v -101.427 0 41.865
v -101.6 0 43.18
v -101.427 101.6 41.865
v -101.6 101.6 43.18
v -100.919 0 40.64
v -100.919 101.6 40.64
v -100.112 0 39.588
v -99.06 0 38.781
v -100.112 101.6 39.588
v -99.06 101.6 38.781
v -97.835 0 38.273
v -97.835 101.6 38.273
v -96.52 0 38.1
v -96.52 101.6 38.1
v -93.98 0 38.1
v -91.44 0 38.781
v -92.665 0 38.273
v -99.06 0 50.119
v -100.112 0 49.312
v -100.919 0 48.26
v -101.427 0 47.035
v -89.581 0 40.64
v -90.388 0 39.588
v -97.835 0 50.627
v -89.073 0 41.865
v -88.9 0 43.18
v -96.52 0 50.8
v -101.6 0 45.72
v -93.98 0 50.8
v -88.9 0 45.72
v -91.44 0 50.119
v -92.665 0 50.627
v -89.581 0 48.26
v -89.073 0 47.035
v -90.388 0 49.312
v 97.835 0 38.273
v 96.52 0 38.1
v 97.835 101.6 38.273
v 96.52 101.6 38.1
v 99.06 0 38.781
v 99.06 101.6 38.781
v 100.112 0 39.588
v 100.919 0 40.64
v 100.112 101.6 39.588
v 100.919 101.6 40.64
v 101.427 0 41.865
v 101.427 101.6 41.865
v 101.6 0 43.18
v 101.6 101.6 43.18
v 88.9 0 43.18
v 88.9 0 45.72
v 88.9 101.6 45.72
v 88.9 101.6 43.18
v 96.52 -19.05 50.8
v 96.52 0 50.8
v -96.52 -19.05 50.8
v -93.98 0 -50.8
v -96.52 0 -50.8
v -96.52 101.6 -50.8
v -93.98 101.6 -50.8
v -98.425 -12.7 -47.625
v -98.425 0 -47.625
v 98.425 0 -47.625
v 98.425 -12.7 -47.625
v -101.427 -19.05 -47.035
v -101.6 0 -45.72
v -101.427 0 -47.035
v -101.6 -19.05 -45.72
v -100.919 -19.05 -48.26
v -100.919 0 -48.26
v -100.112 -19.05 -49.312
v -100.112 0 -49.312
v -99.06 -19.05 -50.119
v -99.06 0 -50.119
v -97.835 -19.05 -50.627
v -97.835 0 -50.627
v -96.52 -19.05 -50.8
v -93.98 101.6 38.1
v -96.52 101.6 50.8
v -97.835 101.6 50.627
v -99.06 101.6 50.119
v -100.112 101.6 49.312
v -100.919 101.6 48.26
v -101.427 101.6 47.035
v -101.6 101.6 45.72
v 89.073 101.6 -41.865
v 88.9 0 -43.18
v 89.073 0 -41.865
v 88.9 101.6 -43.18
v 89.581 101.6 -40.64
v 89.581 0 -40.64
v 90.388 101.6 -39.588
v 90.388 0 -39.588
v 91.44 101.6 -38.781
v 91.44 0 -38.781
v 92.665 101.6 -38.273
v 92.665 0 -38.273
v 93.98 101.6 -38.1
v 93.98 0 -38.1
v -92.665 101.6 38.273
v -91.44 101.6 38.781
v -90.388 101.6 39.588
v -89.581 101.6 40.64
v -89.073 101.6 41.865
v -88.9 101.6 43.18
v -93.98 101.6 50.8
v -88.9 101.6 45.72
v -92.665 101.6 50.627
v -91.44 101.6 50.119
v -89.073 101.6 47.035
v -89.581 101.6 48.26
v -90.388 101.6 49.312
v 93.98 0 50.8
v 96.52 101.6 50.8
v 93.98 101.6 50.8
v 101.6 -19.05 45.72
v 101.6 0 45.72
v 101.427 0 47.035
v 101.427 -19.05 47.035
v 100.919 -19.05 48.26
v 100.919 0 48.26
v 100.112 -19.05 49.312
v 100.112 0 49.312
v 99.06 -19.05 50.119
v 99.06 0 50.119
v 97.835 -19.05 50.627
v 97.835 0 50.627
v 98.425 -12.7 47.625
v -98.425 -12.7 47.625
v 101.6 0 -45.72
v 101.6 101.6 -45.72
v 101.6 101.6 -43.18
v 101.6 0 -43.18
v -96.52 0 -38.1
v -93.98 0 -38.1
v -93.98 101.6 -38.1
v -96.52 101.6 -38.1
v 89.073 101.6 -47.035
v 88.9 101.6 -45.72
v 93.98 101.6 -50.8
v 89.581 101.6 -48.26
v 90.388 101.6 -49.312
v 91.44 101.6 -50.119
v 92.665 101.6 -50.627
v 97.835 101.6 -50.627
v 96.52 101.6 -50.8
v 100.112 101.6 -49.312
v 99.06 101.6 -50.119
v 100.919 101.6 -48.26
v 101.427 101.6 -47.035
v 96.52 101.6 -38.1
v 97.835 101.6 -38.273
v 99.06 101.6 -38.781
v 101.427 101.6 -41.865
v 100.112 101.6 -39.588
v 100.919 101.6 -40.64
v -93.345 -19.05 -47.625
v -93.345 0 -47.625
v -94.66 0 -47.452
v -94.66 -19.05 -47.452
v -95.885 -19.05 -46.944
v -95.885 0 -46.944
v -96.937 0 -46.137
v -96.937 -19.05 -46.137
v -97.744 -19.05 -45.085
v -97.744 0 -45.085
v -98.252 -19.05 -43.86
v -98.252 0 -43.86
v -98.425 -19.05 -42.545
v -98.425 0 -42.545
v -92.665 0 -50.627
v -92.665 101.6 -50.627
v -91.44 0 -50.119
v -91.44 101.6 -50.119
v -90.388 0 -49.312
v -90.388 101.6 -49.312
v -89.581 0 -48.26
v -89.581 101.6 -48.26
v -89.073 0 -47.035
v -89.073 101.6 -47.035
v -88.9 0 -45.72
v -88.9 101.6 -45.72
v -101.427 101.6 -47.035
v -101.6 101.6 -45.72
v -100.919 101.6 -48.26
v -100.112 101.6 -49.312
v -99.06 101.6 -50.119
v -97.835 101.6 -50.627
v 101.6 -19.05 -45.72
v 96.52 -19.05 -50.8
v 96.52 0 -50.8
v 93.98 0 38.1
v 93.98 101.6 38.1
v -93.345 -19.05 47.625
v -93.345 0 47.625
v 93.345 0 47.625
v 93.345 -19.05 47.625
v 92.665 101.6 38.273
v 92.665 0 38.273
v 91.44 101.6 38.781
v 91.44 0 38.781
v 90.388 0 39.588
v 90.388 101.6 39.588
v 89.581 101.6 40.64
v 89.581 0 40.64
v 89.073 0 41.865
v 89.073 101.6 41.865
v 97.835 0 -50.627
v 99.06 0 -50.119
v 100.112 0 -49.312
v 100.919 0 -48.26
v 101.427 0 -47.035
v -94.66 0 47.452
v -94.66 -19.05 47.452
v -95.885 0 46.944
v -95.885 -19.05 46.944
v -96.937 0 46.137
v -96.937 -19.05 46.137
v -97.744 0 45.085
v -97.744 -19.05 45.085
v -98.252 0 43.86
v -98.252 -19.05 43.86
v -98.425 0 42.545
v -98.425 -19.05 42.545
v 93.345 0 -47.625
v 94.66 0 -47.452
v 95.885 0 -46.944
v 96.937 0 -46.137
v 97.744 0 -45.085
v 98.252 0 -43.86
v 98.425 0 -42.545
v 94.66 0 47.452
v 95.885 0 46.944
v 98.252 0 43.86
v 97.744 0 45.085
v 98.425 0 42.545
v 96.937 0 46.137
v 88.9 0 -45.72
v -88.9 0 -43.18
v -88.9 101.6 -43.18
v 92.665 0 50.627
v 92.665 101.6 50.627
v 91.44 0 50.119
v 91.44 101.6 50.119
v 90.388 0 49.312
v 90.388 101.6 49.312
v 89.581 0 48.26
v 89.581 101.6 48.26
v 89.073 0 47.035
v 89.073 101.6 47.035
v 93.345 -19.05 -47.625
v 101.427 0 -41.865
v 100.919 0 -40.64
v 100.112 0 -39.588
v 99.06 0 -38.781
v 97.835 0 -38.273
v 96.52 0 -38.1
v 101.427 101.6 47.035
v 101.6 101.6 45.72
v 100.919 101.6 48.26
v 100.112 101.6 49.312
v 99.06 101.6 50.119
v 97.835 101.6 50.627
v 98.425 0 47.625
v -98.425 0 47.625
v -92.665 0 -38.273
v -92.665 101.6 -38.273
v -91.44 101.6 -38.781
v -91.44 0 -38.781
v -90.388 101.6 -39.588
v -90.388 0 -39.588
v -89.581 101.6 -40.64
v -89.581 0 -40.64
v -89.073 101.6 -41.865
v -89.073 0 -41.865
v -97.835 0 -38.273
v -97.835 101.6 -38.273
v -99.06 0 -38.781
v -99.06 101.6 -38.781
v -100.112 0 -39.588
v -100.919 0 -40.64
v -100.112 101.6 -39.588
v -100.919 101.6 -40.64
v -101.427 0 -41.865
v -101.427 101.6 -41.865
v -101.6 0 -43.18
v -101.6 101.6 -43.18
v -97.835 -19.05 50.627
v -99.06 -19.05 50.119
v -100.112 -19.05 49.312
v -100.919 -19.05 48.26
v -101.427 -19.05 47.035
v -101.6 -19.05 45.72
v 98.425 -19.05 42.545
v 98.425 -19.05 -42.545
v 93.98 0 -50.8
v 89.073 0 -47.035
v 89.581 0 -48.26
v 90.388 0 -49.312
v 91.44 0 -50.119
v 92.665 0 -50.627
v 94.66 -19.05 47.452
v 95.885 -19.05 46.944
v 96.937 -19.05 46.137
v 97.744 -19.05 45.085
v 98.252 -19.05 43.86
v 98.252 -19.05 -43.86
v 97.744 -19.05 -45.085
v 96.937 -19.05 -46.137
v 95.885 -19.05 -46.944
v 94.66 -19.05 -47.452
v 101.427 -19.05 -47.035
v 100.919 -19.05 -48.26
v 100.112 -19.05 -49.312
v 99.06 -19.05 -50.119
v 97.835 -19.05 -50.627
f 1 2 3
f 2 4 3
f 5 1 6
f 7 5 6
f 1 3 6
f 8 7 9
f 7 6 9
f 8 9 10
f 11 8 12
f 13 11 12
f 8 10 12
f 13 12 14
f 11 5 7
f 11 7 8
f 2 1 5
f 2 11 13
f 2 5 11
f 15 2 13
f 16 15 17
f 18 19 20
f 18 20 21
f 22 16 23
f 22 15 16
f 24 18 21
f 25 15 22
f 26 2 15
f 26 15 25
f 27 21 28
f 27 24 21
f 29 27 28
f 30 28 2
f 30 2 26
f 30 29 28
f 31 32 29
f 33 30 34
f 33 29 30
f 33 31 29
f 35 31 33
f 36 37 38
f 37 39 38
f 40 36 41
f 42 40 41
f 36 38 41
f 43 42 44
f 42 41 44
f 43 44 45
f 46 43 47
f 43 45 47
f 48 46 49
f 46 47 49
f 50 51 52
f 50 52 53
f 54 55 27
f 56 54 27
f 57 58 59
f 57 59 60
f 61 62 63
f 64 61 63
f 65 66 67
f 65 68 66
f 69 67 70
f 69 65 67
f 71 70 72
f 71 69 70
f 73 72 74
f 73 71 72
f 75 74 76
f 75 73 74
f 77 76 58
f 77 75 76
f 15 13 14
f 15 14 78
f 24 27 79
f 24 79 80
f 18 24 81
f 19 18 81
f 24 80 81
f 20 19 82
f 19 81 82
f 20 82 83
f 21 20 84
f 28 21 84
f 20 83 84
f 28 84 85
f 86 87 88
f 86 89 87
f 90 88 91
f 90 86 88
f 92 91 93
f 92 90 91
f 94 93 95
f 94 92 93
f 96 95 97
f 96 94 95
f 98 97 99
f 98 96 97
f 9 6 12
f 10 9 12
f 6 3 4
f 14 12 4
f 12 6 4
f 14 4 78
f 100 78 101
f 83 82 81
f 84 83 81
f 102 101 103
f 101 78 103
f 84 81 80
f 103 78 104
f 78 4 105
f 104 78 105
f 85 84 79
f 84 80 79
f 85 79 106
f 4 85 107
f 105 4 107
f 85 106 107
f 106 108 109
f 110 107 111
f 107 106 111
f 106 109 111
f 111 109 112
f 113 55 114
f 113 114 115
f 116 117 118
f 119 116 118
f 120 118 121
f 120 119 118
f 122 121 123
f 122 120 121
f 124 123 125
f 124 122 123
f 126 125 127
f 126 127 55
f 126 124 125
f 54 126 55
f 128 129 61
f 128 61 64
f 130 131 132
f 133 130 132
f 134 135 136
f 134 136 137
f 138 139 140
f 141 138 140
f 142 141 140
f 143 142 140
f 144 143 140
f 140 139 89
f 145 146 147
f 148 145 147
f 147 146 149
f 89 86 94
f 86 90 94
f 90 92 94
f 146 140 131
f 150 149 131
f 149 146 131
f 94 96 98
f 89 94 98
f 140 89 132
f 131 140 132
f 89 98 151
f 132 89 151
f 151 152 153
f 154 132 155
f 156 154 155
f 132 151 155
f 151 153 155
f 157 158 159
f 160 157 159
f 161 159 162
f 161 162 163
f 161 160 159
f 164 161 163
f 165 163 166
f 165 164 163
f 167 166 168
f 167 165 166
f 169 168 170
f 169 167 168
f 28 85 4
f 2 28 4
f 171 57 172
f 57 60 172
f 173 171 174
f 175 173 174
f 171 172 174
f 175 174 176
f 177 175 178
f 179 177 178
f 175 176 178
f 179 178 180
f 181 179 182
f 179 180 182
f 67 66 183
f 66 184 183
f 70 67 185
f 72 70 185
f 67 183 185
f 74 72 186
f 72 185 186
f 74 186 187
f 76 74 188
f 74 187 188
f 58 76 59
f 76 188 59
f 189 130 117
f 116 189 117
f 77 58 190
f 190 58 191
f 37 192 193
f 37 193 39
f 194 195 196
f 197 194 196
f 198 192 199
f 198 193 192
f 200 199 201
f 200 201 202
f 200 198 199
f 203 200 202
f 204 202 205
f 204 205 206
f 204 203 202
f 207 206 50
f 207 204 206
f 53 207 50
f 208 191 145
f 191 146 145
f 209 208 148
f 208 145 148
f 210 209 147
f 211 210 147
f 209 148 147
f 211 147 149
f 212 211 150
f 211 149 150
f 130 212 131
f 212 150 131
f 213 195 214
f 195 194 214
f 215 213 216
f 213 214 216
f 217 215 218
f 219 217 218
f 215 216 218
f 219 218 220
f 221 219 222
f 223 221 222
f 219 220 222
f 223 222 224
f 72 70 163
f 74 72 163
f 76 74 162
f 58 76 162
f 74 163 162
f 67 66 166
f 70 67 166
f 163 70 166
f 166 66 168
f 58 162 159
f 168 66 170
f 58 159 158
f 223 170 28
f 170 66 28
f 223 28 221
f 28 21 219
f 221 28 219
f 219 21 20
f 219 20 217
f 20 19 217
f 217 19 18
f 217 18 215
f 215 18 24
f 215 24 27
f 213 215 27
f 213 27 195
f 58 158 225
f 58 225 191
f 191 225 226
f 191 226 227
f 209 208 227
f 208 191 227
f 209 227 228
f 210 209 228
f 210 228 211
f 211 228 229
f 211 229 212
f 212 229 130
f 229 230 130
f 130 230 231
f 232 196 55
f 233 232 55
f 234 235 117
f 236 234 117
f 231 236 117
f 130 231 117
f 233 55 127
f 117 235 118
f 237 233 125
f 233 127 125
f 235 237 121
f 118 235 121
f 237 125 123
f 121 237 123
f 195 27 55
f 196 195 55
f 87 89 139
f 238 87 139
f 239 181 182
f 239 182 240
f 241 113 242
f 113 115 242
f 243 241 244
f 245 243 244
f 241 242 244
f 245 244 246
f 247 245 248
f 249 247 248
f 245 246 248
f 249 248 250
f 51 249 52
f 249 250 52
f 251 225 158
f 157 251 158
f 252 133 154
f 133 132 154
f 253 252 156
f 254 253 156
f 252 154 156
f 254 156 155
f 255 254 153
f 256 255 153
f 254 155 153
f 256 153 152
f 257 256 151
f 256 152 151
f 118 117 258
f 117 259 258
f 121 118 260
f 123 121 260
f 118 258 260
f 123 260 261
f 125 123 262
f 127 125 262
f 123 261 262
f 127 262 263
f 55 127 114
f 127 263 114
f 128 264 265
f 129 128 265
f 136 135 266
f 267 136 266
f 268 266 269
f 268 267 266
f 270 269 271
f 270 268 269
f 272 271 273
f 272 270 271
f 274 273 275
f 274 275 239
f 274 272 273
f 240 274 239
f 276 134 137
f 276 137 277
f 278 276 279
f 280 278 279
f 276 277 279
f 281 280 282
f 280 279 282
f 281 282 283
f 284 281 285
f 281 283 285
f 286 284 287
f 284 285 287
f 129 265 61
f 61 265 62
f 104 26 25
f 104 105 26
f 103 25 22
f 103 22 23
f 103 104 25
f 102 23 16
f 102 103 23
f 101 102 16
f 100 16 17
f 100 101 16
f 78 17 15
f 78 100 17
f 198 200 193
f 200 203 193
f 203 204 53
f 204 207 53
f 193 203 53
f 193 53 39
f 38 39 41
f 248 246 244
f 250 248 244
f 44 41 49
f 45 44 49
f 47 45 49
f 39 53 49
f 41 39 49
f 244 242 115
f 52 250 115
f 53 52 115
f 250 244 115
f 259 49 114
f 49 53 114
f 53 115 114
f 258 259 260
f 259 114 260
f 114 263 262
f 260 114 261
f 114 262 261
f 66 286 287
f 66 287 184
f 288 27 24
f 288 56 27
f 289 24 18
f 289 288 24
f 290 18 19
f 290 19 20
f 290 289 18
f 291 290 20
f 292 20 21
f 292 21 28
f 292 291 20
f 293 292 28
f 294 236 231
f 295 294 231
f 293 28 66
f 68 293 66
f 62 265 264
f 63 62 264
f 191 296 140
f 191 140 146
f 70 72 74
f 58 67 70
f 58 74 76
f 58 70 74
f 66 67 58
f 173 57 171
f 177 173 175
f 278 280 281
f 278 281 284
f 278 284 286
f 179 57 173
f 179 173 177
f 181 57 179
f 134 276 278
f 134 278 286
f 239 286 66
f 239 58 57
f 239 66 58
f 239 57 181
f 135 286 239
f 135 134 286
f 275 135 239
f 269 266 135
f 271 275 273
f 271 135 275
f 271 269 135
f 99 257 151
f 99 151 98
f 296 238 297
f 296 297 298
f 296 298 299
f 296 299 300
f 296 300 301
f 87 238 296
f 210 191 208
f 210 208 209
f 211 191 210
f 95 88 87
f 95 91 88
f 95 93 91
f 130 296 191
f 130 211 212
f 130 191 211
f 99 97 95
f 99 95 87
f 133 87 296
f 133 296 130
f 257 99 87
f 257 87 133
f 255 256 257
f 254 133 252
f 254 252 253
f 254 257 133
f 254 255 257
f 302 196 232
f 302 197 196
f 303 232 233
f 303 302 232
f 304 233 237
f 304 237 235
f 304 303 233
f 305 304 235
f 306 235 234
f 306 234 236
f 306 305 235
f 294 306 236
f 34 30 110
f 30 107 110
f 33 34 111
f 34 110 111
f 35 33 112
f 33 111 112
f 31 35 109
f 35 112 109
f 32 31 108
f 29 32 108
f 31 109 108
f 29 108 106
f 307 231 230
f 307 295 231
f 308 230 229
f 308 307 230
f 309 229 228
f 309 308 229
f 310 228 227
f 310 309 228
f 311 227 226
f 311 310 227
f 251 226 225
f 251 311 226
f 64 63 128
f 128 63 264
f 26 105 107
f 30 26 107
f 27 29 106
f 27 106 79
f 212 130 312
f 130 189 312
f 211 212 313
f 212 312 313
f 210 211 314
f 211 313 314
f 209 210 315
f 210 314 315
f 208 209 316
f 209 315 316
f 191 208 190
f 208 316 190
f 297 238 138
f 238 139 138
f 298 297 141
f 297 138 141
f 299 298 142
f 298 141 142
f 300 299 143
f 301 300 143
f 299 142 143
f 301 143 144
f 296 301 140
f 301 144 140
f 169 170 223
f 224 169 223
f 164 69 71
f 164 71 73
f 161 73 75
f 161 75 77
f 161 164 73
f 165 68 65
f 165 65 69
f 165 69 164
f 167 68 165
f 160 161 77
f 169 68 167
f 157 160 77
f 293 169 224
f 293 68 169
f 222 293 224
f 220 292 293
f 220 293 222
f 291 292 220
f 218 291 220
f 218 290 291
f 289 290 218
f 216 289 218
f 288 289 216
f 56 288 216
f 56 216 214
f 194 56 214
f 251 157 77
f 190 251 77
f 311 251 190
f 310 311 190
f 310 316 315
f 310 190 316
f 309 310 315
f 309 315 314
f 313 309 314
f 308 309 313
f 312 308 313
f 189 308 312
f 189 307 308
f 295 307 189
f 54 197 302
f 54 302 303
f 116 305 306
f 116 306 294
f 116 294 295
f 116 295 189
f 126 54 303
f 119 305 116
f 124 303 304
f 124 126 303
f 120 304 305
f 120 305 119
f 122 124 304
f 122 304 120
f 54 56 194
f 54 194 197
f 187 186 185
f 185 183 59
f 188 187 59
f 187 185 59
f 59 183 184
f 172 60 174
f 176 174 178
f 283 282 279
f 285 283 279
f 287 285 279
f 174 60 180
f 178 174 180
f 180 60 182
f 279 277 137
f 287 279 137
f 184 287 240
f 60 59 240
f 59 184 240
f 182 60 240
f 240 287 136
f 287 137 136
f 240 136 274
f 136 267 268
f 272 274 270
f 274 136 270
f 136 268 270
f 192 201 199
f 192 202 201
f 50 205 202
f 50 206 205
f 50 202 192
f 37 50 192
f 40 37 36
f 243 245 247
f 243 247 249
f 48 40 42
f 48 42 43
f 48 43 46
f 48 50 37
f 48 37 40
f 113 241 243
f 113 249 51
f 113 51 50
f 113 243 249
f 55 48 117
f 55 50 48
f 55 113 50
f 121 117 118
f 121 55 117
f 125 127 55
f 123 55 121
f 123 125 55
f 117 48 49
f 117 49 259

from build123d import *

# Parameters (mm, degrees)
F0_W     = 9.525
F0_H     = 9.525
F1_DEPTH = 12.7
F0_W_2   = 3.175
F0_H_2   = 76.2
F0_W_3   = 177.8
F0_H_3   = 3.175
F2_DEPTH = 19.05
F3_DEPTH = 101.6
F4_R     = 5.08
F4_2_R   = 5.08
F4_3_R   = 5.08
F4_4_R   = 5.08
F4_5_R   = 5.08


with BuildPart() as f1:
    # F0 (on Front) → F1 (new body)
    with BuildSketch(Plane.XZ):
        Polygon((88.9, 38.1), (88.9, 47.625), (-88.9, 47.625), (-88.9, 38.1), (-98.425, 38.1), (-98.425, -38.1), (-88.9, -38.1), (-88.9, -47.625), (88.9, -47.625), (88.9, -38.1), (98.425, -38.1), (98.425, 38.1), align=None)
        with Locations((-93.6625, 42.8625)):
            Rectangle(F0_W, F0_H)
        with Locations((-93.6625, -42.8625)):
            Rectangle(F0_W, F0_H)
        with Locations((93.6625, 42.8625)):
            Rectangle(F0_W, F0_H)
        with Locations((93.6625, -42.8625)):
            Rectangle(F0_W, F0_H)
    extrude(amount=F1_DEPTH)


with BuildPart() as f2:
    # F0 (on Front) → F2 (new body)
    with BuildSketch(Plane.XZ):
        with Locations((-100.0125, 0)):
            Rectangle(F0_W_2, F0_H_2)
        Polygon((-88.9, 47.625), (-88.9, 50.8), (-101.6, 50.8), (-101.6, 38.1), (-98.425, 38.1), (-98.425, 47.625), align=None)
        with Locations((0, 49.2125)):
            Rectangle(F0_W_3, F0_H_3)
        Polygon((101.6, 38.1), (101.6, 50.8), (88.9, 50.8), (88.9, 47.625), (98.425, 47.625), (98.425, 38.1), align=None)
        with Locations((100.0125, 0)):
            Rectangle(F0_W_2, F0_H_2)
        with Locations((0, -49.2125)):
            Rectangle(F0_W_3, F0_H_3)
        Polygon((101.6, -50.8), (101.6, -38.1), (98.425, -38.1), (98.425, -47.625), (88.9, -47.625), (88.9, -50.8), align=None)
        Polygon((-98.425, -38.1), (-101.6, -38.1), (-101.6, -50.8), (-88.9, -50.8), (-88.9, -47.625), (-98.425, -47.625), align=None)
    extrude(amount=F2_DEPTH)

    # F4
    f4_edges = [f2.edges().sort_by_distance(p)[0] for p in [
        (98.425, -9.525, -47.625),
        (98.425, -9.525, 47.625),
        (-98.425, -9.525, -47.625),
        (-98.425, -9.525, 47.625),
        (101.6, -9.525, -50.8),
        (101.6, -9.525, 50.8),
        (-101.6, -9.525, 50.8),
        (-101.6, -9.525, -50.8),
    ]]
    fillet(f4_edges, radius=F4_R)


with BuildPart() as f3:
    # F0 (on Front) → F3 (new body)
    with BuildSketch(Plane.XZ):
        with Locations((-93.6625, 42.8625)):
            Rectangle(F0_W, F0_H)
        Polygon((-88.9, 47.625), (-88.9, 50.8), (-101.6, 50.8), (-101.6, 38.1), (-98.425, 38.1), (-98.425, 47.625), align=None)
    extrude(amount=-F3_DEPTH)

    # F4#5
    f4_5_edges = [f3.edges().sort_by_distance(p)[0] for p in [
        (-101.6, 50.8, 38.1),
        (-101.6, 50.8, 50.8),
        (-88.9, 50.8, 50.8),
        (-88.9, 50.8, 38.1),
    ]]
    fillet(f4_5_edges, radius=F4_5_R)


with BuildPart() as f3b:
    # F0 (on Front) → F3, piece 2 (new body)
    with BuildSketch(Plane.XZ):
        with Locations((-93.6625, -42.8625)):
            Rectangle(F0_W, F0_H)
        Polygon((-98.425, -38.1), (-101.6, -38.1), (-101.6, -50.8), (-88.9, -50.8), (-88.9, -47.625), (-98.425, -47.625), align=None)
    extrude(amount=-F3_DEPTH)

    # F4#4
    f4_4_edges = [f3b.edges().sort_by_distance(p)[0] for p in [
        (-101.6, 50.8, -50.8),
        (-88.9, 50.8, -50.8),
        (-101.6, 50.8, -38.1),
        (-88.9, 50.8, -38.1),
    ]]
    fillet(f4_4_edges, radius=F4_4_R)


with BuildPart() as f3c:
    # F0 (on Front) → F3, piece 3 (new body)
    with BuildSketch(Plane.XZ):
        with Locations((93.6625, -42.8625)):
            Rectangle(F0_W, F0_H)
        Polygon((101.6, -50.8), (101.6, -38.1), (98.425, -38.1), (98.425, -47.625), (88.9, -47.625), (88.9, -50.8), align=None)
    extrude(amount=-F3_DEPTH)

    # F4#3
    f4_3_edges = [f3c.edges().sort_by_distance(p)[0] for p in [
        (101.6, 50.8, -38.1),
        (101.6, 50.8, -50.8),
        (88.9, 50.8, -38.1),
        (88.9, 50.8, -50.8),
    ]]
    fillet(f4_3_edges, radius=F4_3_R)


with BuildPart() as f3d:
    # F0 (on Front) → F3, piece 4 (new body)
    with BuildSketch(Plane.XZ):
        with Locations((93.6625, 42.8625)):
            Rectangle(F0_W, F0_H)
        Polygon((101.6, 38.1), (101.6, 50.8), (88.9, 50.8), (88.9, 47.625), (98.425, 47.625), (98.425, 38.1), align=None)
    extrude(amount=-F3_DEPTH)

    # F4#2
    f4_2_edges = [f3d.edges().sort_by_distance(p)[0] for p in [
        (101.6, 50.8, 50.8),
        (88.9, 50.8, 38.1),
        (88.9, 50.8, 50.8),
        (101.6, 50.8, 38.1),
    ]]
    fillet(f4_2_edges, radius=F4_2_R)


solid = Compound([f1.part, f2.part, f3.part, f3b.part, f3c.part, f3d.part])
